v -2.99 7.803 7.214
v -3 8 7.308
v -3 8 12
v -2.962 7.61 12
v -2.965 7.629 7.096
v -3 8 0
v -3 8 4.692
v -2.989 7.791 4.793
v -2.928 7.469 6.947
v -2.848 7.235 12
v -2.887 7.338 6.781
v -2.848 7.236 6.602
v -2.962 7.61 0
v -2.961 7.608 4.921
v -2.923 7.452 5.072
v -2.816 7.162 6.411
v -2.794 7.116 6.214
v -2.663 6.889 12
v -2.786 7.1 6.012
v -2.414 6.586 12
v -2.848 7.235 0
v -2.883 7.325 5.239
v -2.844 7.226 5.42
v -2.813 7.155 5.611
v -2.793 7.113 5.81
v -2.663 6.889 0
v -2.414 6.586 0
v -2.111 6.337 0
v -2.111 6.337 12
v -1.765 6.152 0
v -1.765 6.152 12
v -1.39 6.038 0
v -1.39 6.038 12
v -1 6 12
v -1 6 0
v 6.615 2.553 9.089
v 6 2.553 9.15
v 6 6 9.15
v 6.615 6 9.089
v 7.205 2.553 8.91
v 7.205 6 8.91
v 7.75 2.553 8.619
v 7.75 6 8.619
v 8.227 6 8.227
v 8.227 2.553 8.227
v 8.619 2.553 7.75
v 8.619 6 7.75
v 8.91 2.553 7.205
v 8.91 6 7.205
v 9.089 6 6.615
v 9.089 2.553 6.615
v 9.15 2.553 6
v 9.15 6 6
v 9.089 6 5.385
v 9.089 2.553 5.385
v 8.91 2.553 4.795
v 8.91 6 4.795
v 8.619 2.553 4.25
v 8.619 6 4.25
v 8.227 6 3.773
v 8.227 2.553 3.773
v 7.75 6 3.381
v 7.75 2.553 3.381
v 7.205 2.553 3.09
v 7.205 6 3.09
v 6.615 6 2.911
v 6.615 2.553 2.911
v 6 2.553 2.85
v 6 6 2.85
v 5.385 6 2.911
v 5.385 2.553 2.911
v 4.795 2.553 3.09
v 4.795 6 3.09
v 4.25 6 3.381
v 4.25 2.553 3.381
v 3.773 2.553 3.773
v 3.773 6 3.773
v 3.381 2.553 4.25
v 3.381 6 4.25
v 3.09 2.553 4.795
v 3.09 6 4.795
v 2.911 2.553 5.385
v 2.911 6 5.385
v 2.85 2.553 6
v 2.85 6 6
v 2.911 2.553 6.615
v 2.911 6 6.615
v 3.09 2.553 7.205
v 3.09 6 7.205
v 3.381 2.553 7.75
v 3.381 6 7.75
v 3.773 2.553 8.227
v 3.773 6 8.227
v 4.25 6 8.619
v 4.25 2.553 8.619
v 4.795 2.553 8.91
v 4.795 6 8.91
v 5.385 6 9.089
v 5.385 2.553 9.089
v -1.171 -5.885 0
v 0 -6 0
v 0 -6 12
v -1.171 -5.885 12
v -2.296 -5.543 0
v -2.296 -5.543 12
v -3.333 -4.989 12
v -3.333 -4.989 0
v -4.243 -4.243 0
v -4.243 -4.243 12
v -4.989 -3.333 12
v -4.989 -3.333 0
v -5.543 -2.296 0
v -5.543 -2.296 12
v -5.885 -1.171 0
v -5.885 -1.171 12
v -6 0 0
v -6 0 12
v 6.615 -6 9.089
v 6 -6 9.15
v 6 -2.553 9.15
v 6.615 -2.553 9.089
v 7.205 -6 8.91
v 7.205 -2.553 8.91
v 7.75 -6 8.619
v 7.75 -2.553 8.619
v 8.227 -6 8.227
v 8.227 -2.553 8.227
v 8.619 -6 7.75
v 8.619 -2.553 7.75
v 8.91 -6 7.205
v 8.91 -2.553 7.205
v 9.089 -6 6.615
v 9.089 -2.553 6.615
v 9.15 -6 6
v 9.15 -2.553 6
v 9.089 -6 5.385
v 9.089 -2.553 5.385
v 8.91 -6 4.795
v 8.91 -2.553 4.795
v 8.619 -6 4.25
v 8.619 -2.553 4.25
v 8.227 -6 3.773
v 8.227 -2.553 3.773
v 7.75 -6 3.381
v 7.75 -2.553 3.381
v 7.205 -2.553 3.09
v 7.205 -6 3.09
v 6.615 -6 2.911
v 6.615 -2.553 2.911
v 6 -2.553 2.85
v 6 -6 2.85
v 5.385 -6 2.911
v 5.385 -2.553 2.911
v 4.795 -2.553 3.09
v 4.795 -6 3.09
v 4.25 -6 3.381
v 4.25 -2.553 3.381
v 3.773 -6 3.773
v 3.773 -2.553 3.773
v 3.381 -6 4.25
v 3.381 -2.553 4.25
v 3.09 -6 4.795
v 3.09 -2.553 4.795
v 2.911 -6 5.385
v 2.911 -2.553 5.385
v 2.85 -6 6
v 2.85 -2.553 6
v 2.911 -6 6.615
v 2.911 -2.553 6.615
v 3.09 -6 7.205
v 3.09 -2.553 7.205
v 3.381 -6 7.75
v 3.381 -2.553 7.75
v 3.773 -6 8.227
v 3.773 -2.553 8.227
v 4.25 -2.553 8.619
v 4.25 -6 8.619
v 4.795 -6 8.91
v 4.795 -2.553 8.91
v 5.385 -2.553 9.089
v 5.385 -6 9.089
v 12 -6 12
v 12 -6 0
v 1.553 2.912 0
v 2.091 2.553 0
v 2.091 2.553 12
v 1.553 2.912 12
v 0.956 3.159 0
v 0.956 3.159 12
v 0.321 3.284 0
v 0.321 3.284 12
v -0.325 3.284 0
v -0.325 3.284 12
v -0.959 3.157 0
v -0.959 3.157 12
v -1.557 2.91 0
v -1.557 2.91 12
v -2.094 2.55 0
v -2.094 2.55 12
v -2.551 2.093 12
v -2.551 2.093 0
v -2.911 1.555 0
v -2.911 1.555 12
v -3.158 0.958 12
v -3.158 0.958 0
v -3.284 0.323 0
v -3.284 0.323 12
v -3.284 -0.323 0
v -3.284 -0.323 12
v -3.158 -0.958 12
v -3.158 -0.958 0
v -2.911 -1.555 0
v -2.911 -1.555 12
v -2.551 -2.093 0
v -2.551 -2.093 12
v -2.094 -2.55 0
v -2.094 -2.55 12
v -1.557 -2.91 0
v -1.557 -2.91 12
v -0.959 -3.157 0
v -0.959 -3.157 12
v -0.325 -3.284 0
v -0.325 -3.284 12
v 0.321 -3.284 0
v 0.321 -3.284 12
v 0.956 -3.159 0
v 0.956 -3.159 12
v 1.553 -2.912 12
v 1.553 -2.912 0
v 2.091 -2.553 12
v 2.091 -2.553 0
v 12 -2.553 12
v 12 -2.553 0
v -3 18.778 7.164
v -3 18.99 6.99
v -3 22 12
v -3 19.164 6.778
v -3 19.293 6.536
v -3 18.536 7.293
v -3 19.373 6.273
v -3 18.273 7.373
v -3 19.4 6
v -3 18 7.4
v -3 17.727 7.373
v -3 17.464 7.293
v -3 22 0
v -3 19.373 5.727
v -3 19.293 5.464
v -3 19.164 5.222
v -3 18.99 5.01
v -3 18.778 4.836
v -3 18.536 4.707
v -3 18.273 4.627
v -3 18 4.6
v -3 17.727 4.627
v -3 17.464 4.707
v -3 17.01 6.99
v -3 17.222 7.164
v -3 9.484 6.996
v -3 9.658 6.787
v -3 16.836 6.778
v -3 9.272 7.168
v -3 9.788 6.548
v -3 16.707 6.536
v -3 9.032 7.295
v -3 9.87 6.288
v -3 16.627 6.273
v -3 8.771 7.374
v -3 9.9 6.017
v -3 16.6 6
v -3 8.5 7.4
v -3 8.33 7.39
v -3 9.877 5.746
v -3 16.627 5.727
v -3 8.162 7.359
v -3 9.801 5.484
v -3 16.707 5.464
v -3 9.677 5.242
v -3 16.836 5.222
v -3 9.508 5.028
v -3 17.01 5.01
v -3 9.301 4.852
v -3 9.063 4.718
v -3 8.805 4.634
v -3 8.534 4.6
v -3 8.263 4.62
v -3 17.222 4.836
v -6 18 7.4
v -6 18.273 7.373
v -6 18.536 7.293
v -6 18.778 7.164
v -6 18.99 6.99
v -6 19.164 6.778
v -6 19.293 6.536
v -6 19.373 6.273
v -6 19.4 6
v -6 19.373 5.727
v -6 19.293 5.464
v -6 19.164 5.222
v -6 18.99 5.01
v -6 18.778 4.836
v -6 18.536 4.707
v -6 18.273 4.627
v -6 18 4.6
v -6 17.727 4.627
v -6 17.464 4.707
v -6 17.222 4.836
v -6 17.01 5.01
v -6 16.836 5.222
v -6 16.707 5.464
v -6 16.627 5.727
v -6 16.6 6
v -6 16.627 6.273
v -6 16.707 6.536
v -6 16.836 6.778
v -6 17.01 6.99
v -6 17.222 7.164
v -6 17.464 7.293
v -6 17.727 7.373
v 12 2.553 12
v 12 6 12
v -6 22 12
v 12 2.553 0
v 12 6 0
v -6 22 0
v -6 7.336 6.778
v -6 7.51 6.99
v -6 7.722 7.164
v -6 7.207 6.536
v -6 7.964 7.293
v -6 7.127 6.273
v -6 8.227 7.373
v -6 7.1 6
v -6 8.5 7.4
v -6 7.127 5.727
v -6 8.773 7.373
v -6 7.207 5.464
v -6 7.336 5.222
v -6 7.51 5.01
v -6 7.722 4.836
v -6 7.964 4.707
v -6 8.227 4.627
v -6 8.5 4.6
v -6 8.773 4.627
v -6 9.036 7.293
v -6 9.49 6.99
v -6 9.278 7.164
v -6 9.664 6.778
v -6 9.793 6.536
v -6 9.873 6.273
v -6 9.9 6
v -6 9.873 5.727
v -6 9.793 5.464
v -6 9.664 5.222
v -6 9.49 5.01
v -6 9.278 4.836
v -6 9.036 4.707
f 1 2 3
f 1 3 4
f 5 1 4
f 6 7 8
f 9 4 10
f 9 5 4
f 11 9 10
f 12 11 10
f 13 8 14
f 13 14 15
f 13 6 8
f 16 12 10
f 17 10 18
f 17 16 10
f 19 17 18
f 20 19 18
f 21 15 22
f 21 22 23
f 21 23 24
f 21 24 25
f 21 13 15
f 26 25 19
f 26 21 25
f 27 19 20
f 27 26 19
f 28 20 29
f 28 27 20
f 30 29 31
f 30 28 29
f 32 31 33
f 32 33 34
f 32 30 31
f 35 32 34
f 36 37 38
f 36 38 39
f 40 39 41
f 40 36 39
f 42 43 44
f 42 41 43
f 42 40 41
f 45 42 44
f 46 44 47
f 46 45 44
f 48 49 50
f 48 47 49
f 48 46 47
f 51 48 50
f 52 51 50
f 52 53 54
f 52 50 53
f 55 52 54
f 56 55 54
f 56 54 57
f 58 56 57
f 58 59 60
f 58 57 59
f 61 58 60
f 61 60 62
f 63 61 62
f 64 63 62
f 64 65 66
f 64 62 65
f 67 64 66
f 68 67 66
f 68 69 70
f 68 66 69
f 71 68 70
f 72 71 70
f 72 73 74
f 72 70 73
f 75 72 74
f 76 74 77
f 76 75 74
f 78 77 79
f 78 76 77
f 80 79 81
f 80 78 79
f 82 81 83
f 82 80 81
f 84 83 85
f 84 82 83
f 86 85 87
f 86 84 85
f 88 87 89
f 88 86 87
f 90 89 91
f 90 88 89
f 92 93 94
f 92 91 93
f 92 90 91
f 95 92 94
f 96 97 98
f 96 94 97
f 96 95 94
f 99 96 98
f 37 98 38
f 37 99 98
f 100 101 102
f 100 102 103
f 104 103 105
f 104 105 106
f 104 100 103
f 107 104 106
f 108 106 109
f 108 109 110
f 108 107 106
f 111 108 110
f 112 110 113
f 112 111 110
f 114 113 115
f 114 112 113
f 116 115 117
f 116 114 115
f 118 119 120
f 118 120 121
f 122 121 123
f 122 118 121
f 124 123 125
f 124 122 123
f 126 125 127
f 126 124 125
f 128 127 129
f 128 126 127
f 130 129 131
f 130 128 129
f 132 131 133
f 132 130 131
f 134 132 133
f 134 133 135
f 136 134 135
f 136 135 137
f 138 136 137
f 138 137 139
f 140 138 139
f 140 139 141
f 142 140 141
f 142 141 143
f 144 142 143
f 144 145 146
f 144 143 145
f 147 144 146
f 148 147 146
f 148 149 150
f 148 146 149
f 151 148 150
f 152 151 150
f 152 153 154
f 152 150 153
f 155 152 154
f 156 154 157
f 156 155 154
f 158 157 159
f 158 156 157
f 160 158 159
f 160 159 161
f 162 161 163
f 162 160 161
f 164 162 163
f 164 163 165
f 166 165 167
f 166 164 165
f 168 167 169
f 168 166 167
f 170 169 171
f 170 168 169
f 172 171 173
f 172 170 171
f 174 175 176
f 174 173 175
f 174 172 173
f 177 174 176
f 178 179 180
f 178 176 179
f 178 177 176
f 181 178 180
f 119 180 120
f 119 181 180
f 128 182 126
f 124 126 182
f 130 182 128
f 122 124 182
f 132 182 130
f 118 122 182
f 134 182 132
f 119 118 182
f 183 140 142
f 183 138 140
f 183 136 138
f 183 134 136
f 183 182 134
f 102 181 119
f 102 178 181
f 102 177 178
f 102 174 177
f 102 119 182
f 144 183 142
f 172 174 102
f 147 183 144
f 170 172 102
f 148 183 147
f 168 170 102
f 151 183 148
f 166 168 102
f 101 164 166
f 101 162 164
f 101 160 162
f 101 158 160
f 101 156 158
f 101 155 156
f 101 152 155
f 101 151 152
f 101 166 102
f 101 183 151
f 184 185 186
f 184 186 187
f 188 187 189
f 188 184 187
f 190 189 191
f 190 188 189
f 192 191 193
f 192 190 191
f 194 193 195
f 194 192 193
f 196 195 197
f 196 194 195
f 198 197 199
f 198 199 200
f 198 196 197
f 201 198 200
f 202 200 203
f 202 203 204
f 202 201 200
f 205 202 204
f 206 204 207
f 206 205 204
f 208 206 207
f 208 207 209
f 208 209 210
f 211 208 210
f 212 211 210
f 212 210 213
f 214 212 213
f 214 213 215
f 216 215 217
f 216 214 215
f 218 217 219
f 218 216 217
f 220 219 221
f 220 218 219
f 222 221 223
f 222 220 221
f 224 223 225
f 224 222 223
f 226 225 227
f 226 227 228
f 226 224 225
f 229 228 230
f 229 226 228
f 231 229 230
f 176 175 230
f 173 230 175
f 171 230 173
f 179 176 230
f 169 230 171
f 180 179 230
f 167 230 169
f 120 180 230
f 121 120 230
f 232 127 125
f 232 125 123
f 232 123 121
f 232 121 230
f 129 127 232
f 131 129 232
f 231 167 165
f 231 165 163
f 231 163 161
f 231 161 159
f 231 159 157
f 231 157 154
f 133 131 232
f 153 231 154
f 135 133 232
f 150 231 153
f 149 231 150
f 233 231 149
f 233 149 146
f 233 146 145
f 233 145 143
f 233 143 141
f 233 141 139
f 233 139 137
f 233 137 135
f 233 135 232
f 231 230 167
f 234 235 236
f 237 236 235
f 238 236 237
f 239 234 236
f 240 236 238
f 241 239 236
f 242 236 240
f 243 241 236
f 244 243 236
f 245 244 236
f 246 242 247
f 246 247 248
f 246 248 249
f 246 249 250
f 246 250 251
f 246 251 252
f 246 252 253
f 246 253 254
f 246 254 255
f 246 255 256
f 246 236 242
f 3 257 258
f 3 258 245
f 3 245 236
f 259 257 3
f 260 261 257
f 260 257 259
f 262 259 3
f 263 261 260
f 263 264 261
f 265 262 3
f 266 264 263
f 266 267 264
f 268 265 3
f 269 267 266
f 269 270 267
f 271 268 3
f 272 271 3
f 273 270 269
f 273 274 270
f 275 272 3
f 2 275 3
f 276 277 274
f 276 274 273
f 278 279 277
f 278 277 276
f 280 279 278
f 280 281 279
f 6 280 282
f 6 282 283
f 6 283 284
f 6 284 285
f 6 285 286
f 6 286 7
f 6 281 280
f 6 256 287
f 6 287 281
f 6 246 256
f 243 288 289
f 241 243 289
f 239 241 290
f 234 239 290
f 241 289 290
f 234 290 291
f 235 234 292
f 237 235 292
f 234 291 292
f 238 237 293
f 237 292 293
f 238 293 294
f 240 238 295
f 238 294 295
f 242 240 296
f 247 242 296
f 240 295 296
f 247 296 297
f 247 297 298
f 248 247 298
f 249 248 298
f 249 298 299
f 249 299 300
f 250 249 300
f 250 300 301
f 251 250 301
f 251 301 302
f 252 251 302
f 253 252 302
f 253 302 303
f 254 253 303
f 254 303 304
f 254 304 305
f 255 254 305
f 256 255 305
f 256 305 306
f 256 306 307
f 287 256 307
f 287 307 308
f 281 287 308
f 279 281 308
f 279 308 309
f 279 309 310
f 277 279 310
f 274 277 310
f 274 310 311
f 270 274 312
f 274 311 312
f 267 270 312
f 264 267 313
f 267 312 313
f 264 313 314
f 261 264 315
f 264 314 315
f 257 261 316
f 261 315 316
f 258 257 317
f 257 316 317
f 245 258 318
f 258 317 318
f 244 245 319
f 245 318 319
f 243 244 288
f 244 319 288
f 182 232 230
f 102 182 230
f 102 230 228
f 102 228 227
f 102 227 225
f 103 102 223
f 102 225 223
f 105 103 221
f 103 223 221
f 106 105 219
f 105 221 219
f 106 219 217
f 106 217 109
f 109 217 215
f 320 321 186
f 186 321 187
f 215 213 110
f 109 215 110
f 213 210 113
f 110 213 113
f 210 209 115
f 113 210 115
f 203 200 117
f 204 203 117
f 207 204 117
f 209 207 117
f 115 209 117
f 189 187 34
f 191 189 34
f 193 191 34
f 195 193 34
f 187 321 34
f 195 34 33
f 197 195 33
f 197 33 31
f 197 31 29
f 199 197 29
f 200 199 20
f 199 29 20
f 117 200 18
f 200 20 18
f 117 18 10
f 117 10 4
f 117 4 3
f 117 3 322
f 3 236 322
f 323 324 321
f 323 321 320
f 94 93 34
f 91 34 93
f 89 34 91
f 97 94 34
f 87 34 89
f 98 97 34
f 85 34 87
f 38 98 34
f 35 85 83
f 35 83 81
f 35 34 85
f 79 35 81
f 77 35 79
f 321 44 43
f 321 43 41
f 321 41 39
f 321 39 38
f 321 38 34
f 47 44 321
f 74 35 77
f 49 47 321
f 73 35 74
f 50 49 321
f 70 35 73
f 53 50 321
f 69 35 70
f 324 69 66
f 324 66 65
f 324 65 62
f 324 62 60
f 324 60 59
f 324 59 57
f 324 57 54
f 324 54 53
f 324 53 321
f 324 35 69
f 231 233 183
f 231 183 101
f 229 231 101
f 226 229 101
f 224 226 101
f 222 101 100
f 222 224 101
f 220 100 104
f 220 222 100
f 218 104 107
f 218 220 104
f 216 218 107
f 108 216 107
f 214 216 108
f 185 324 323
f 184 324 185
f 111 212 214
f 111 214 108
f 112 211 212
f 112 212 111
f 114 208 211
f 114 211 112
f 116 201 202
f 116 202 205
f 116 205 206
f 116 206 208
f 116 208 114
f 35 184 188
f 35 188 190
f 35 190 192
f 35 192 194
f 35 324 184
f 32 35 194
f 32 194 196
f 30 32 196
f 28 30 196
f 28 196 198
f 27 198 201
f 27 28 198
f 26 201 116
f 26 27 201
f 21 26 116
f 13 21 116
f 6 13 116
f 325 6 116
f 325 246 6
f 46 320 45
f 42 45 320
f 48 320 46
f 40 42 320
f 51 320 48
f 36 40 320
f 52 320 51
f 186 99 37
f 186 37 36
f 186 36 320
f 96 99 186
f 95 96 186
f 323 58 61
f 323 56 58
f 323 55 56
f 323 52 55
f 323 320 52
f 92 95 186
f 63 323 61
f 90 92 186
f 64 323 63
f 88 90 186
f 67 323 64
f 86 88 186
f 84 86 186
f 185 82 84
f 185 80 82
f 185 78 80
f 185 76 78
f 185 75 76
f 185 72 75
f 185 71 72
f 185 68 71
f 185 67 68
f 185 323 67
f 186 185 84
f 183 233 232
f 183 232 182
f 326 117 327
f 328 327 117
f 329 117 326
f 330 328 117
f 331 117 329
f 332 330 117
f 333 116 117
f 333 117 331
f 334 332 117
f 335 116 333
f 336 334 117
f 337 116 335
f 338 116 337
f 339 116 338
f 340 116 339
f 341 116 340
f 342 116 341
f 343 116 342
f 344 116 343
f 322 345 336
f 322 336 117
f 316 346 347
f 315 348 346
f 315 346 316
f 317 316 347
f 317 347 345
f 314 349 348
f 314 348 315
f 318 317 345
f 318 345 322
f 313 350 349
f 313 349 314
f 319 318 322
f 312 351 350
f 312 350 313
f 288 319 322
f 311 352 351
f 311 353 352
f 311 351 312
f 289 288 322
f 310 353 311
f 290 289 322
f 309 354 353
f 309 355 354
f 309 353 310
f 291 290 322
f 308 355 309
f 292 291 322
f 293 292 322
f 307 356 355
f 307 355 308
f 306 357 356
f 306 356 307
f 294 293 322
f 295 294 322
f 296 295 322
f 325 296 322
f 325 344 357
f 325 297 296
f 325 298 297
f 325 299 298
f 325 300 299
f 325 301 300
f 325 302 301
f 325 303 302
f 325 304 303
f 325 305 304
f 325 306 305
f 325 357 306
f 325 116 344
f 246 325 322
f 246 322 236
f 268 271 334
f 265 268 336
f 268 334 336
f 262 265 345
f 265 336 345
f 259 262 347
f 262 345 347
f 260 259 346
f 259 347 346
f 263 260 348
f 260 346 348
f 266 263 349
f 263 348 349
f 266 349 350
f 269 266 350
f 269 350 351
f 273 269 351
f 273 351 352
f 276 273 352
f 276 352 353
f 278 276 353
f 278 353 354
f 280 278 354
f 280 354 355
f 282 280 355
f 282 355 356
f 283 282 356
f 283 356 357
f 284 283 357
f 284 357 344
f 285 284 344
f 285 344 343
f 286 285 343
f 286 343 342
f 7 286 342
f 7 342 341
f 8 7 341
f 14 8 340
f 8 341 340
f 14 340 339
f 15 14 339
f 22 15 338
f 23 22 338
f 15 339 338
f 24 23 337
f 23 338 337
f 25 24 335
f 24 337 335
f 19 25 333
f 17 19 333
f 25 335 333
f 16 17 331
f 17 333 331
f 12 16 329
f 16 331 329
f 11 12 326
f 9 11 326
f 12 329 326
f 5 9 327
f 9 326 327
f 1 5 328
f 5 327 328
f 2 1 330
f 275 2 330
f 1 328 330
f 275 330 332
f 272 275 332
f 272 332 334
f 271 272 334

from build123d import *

# Parameters (mm, degrees)
BOSS_EXTRUDE1_DEPTH     = 12
CUT_EXTRUDE1_DEPTH      = 28.784887979
CUT_EXTRUDE1_DEPTH_BACK = 28.784887979
SKETCH2_R               = 3.15
CUT_EXTRUDE2_REACH      = 32.854
SKETCH3_R               = 1.4


with BuildPart() as part:
    # Sketch1 → Boss-Extrude1 (new body)
    with BuildSketch(Plane.XY):
        with BuildLine():
            Line((-1, 6), (12, 6))
            Line((12, 6), (12, 2.552710574))
            Line((12, 2.552710574), (2.091331807, 2.552710574))
            ThreePointArc((2.091331807, 2.552710574), (-3.3, 0), (2.091331807, -2.552710574))
            Line((2.091331807, -2.552710574), (12, -2.552710574))
            Line((12, -2.552710574), (12, -6))
            Line((12, -6), (0, -6))
            ThreePointArc((0, -6), (-4.242640687, -4.242640687), (-6, 0))
            Line((-6, 0), (-6, 22))
            Line((-6, 22), (-3, 22))
            Line((-3, 22), (-3, 8))
            ThreePointArc((-3, 8), (-2.414213562, 6.585786438), (-1, 6))
        make_face()
    extrude(amount=BOSS_EXTRUDE1_DEPTH)

    # Sketch2 → Cut-Extrude1 (cut, two sides: drawn at the far end of the back side and taken through both)
    with BuildSketch(Plane(origin=(0, 0, 0), x_dir=(1, 0, 0), z_dir=(0, 1, 0)).offset(-CUT_EXTRUDE1_DEPTH_BACK)):
        with Locations(Location((6, -6, 0), (0, 0, 270))):
            Circle(SKETCH2_R)
    extrude(amount=CUT_EXTRUDE1_DEPTH + CUT_EXTRUDE1_DEPTH_BACK, mode=Mode.SUBTRACT)

    # Sketch3 → Cut-Extrude2 (cut, up to next)
    with BuildSketch(Plane.ZY.offset(6), mode=Mode.PRIVATE) as cut_extrude2_sk1:
        with Locations((6, 18)):
            Circle(SKETCH3_R)
    cut_extrude2_tool1 = extrude(cut_extrude2_sk1.sketch, amount=-CUT_EXTRUDE2_REACH, mode=Mode.PRIVATE) & part.part
    # Sketch3 → Cut-Extrude2 (cut, up to next)
    with BuildSketch(Plane.ZY.offset(6), mode=Mode.PRIVATE) as cut_extrude2_sk2:
        with Locations((6, 8.5)):
            Circle(SKETCH3_R)
    cut_extrude2_tool2 = extrude(cut_extrude2_sk2.sketch, amount=-CUT_EXTRUDE2_REACH, mode=Mode.PRIVATE) & part.part
    add(cut_extrude2_tool1.solids().sort_by_distance((-6, 18, 6))[0], mode=Mode.SUBTRACT)
    add(cut_extrude2_tool2.solids().sort_by_distance((-6, 8.5, 6))[0], mode=Mode.SUBTRACT)


solid = part.part
